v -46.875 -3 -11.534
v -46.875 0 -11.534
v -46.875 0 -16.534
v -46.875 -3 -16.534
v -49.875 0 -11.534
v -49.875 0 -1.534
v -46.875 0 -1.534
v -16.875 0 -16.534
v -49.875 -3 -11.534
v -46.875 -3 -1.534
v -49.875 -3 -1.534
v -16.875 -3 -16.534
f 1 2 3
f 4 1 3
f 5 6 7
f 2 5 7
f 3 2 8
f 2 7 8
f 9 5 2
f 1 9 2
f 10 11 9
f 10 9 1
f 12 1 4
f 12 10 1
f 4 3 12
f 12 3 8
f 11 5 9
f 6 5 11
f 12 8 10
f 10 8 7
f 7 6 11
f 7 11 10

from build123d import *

# Parameters (mm, degrees)
F0_W     = 3
F0_H     = 10
F1_DEPTH = 3


with BuildPart() as f1:
    # F0 (on Front) → F1 (new body)
    with BuildSketch(Plane.XZ):
        Polygon((-16.875, -16.534092), (-46.875, -1.534092), (-46.875, -11.534092), (-46.875, -16.534092), align=None)
        with Locations((-48.375, -6.534092)):
            Rectangle(F0_W, F0_H)
    extrude(amount=F1_DEPTH)


solid = f1.part
